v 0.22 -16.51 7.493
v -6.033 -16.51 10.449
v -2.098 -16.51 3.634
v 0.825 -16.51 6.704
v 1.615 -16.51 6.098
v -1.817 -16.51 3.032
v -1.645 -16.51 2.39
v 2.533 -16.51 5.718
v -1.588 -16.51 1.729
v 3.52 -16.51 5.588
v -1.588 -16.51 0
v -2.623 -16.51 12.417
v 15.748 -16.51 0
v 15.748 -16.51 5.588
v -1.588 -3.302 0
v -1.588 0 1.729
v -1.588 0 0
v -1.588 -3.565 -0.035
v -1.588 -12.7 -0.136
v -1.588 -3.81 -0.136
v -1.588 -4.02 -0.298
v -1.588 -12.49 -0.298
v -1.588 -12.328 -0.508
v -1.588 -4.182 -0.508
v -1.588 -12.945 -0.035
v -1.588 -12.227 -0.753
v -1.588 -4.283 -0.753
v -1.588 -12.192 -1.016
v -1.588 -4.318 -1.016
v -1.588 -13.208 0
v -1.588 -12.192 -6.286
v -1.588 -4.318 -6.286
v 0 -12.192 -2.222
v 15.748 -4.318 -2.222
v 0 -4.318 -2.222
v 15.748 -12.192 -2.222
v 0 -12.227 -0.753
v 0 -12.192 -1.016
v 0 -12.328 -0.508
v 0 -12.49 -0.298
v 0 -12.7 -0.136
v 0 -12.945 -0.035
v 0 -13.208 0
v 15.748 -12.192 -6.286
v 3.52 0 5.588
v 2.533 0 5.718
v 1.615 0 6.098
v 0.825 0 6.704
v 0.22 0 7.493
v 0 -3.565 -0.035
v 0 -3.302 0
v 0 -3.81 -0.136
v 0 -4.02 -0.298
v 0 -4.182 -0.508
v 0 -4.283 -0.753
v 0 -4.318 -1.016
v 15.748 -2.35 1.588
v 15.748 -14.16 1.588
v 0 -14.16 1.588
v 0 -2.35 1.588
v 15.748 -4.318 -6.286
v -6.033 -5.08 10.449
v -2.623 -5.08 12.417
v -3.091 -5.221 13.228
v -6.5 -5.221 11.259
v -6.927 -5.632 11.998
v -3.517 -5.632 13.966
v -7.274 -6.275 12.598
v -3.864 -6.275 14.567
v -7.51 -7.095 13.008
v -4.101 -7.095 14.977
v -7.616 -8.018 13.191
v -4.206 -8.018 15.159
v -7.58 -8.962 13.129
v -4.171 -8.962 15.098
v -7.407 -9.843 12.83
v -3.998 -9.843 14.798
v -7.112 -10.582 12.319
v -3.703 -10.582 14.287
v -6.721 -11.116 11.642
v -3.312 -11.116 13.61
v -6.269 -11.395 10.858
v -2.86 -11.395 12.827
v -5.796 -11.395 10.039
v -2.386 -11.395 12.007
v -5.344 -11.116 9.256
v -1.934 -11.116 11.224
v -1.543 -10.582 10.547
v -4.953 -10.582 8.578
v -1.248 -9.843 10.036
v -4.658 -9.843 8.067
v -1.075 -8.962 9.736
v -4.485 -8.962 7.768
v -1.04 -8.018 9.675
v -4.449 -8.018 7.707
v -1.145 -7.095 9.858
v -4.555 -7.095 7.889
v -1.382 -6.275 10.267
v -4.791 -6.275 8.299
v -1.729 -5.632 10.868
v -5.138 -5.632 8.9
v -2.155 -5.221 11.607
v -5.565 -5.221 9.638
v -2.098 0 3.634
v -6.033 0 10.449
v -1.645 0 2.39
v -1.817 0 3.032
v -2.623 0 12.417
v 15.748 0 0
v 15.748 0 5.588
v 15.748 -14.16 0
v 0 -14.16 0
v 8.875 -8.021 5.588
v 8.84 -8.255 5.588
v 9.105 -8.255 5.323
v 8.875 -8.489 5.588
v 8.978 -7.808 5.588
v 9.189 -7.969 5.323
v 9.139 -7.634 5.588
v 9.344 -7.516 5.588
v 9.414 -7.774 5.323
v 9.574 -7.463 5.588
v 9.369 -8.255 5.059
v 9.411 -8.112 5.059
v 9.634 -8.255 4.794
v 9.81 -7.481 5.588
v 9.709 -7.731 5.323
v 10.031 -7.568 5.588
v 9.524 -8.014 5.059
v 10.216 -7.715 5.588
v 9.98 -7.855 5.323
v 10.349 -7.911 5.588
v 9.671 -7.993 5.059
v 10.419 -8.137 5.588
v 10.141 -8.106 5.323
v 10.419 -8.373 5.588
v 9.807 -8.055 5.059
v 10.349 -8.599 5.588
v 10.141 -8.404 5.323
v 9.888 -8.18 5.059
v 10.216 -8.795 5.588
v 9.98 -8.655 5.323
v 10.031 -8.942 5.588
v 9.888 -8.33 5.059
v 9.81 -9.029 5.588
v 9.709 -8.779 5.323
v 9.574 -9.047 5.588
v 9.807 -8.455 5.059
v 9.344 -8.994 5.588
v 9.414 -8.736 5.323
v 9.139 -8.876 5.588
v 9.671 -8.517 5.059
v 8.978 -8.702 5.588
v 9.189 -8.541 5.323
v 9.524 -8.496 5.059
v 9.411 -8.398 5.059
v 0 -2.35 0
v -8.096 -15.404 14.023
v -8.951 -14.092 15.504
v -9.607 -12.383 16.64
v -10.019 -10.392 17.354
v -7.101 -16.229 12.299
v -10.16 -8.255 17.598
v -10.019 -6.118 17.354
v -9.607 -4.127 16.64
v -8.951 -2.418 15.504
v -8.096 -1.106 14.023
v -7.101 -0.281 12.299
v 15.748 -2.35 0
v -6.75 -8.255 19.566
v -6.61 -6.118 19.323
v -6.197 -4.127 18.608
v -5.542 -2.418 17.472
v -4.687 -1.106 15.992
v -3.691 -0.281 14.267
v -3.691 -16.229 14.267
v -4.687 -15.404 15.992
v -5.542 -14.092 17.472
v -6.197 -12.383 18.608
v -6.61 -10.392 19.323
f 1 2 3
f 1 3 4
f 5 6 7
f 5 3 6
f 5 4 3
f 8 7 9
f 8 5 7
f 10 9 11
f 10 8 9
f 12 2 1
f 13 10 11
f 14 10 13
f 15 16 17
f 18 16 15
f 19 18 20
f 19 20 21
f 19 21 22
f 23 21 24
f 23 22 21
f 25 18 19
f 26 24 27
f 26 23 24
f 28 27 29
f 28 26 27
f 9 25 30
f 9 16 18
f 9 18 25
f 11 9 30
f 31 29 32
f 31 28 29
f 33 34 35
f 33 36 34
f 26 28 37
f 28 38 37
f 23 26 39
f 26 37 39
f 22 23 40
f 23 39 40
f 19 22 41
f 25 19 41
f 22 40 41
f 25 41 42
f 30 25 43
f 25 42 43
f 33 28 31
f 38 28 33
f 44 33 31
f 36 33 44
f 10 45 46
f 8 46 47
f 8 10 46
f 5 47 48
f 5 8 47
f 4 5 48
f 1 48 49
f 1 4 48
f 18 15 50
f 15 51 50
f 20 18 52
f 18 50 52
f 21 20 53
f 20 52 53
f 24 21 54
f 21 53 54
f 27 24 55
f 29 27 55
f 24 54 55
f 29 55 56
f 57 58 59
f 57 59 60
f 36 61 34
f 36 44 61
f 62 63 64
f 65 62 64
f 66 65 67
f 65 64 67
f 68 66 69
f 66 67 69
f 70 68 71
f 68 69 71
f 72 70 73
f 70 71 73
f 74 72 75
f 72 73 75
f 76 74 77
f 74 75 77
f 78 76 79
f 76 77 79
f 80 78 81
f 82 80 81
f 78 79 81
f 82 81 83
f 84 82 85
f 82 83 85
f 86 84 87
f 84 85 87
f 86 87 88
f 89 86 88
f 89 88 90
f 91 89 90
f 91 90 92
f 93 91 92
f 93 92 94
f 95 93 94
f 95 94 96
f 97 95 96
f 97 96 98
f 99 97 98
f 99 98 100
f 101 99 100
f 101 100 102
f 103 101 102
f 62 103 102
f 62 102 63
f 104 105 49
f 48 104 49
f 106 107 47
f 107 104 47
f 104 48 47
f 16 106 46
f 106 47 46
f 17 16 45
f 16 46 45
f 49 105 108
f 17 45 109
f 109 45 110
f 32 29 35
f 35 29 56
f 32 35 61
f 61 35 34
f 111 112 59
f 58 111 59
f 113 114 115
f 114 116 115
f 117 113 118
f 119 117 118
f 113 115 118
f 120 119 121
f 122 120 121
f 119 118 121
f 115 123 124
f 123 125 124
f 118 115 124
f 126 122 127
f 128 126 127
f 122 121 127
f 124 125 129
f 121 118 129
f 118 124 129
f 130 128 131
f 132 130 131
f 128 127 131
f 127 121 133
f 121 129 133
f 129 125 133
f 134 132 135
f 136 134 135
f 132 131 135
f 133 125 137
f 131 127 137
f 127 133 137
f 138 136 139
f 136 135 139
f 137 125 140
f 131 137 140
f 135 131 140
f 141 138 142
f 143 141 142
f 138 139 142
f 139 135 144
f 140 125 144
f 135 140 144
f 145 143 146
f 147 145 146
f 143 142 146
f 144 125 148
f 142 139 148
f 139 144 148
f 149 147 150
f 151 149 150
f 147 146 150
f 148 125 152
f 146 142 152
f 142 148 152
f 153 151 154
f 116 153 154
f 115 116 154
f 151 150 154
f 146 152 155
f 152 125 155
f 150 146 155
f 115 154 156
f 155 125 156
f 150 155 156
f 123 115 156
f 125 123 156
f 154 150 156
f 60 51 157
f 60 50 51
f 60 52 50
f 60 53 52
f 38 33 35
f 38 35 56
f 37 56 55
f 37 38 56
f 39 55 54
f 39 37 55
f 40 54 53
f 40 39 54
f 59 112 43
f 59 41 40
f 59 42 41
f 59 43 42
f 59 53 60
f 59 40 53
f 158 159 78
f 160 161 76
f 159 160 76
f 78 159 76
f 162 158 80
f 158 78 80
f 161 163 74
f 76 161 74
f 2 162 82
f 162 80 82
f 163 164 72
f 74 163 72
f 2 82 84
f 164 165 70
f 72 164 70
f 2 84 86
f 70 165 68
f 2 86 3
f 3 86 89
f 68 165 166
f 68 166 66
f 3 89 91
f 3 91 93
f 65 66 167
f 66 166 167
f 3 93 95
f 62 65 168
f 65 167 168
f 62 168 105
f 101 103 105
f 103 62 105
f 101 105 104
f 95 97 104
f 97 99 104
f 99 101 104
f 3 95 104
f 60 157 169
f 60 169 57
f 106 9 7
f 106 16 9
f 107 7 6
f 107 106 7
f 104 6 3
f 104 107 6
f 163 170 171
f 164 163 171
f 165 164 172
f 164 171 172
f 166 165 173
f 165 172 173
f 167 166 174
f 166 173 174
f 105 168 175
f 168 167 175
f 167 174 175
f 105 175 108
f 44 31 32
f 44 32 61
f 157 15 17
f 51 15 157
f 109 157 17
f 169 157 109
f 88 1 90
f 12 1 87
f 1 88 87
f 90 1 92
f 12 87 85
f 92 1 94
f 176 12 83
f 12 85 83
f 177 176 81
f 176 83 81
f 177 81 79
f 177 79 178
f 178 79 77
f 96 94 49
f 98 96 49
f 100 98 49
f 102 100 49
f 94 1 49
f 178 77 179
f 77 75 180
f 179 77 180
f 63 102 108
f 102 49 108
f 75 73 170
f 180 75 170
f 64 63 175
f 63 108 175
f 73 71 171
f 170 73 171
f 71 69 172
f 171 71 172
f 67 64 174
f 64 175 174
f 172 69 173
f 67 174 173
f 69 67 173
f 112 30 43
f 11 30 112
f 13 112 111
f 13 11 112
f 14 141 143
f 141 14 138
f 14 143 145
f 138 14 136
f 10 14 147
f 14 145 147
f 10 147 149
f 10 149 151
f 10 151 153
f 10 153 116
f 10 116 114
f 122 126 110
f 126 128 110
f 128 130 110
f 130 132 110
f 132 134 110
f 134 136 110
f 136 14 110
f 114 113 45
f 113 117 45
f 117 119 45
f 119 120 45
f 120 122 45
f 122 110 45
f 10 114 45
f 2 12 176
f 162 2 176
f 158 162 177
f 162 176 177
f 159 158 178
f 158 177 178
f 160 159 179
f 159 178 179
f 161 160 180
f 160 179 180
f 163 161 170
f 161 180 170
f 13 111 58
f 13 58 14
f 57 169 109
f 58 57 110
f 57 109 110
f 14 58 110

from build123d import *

# Parameters (mm, degrees)
F1_DEPTH  = 16.51
F2_W      = 11.811
F2_H      = 1.5875
F3_DEPTH  = 25.909
F4_DEPTH  = 25.909
F5_R      = 3.175
F6_DEPTH  = 12.7368181024
F9_DEPTH  = 3.937
F11_DEPTH = 8.255
F12_R     = 1.016
F13_R     = 3.81
F18_DEPTH = 25.4


with BuildPart() as f1:
    # F0 (on Front) → F1 (new body)
    with BuildSketch(Plane.XZ):
        Polygon((0, 0), (15.748, 0), (15.748, 5.588), (1.3198227154, 5.588), (-6.7504579853, 19.5661362049), (-10.16, 17.5976362049), align=None)
    extrude(amount=F1_DEPTH)

    # F2 (on face) → F3 (cut, through all)
    with BuildSketch(Plane.YZ.offset(15.748)):
        with Locations((-8.255, 0.79375)):
            Rectangle(F2_W, F2_H)
    extrude(amount=-F3_DEPTH, mode=Mode.SUBTRACT)

    # F2 (on face) → F4 (cut, through all)
    with BuildSketch(Plane.YZ.offset(15.748)):
        with Locations((-8.255, 0.79375)):
            Rectangle(F2_W, F2_H)
    extrude(amount=-F4_DEPTH, mode=Mode.SUBTRACT)

    # F5 (on face) → F6 (cut, through all)
    with BuildSketch(Plane(origin=(3.4095420147, 0, 1.9685), x_dir=(0, 1, 0), z_dir=(0.8660254038, 0, 0.5))):
        with Locations((-8.255, 12.065)):
            Circle(F5_R)
    extrude(amount=-F6_DEPTH, mode=Mode.SUBTRACT)

    # F8 (on mid) → F9 (join, symmetric)
    with BuildSketch(Plane.XZ.offset(8.255)):
        Polygon((0, -2.2225), (0, 0), (-0.9165435523, 1.5875), (-1.5875, 2.749630657), (-1.5875, -6.2865), (15.748, -6.2865), (15.748, -2.2225), align=None)
    extrude(amount=F9_DEPTH, both=True)

    # F10 (on mid) → F11 (join, symmetric)
    with BuildSketch(Plane.XZ.offset(8.255)):
        Polygon((-1.5875, 0), (0, 0), (0, 1.5875), (-0.9165435523, 1.5875), (-1.5875, 2.749630657), align=None)
    extrude(amount=F11_DEPTH, both=True)

    # F12
    f12_edges = [f1.edges().sort_by_distance(p)[0] for p in [
        (-0.79375, -4.318, 0),
        (-0.79375, -12.192, 0),
    ]]
    fillet(f12_edges, radius=F12_R)

    # F13
    f13_edges = [f1.edges().sort_by_distance(p)[0] for p in [
        (-1.5875, -8.255, 2.749631),
        (1.319823, -8.255, 5.588),
    ]]
    fillet(f13_edges, radius=F13_R)

    # F15 (on mid) → F16 (revolve, cut)
    with BuildSketch(Plane.XZ.offset(8.255)):
        Polygon((9.6337636205, 4.79425), (9.6337636205, 5.588), (8.8400136205, 5.588), align=None)
    revolve(axis=Axis((9.6337636205, -8.255, 5.191125), (0, 0, -1)), mode=Mode.SUBTRACT)

    # F17 (on face) → F18 (cut)
    with BuildSketch(Plane(origin=(3.4095420147, 0, 1.9685), x_dir=(0, 1, 0), z_dir=(0.8660254038, 0, 0.5))):
        with BuildLine():
            Line((-16.51, 20.32), (-16.51, 12.065))
            ThreePointArc((-16.51, 12.065), (-14.0921664787, 17.9021664787), (-8.255, 20.32))
            Line((-8.255, 20.32), (-16.51, 20.32))
        make_face()
        with BuildLine():
            Line((0, 20.32), (-8.255, 20.32))
            ThreePointArc((-8.255, 20.32), (-2.4178335213, 17.9021664787), (0, 12.065))
            Line((0, 12.065), (0, 20.32))
        make_face()
    extrude(amount=-F18_DEPTH, mode=Mode.SUBTRACT)


solid = f1.part
